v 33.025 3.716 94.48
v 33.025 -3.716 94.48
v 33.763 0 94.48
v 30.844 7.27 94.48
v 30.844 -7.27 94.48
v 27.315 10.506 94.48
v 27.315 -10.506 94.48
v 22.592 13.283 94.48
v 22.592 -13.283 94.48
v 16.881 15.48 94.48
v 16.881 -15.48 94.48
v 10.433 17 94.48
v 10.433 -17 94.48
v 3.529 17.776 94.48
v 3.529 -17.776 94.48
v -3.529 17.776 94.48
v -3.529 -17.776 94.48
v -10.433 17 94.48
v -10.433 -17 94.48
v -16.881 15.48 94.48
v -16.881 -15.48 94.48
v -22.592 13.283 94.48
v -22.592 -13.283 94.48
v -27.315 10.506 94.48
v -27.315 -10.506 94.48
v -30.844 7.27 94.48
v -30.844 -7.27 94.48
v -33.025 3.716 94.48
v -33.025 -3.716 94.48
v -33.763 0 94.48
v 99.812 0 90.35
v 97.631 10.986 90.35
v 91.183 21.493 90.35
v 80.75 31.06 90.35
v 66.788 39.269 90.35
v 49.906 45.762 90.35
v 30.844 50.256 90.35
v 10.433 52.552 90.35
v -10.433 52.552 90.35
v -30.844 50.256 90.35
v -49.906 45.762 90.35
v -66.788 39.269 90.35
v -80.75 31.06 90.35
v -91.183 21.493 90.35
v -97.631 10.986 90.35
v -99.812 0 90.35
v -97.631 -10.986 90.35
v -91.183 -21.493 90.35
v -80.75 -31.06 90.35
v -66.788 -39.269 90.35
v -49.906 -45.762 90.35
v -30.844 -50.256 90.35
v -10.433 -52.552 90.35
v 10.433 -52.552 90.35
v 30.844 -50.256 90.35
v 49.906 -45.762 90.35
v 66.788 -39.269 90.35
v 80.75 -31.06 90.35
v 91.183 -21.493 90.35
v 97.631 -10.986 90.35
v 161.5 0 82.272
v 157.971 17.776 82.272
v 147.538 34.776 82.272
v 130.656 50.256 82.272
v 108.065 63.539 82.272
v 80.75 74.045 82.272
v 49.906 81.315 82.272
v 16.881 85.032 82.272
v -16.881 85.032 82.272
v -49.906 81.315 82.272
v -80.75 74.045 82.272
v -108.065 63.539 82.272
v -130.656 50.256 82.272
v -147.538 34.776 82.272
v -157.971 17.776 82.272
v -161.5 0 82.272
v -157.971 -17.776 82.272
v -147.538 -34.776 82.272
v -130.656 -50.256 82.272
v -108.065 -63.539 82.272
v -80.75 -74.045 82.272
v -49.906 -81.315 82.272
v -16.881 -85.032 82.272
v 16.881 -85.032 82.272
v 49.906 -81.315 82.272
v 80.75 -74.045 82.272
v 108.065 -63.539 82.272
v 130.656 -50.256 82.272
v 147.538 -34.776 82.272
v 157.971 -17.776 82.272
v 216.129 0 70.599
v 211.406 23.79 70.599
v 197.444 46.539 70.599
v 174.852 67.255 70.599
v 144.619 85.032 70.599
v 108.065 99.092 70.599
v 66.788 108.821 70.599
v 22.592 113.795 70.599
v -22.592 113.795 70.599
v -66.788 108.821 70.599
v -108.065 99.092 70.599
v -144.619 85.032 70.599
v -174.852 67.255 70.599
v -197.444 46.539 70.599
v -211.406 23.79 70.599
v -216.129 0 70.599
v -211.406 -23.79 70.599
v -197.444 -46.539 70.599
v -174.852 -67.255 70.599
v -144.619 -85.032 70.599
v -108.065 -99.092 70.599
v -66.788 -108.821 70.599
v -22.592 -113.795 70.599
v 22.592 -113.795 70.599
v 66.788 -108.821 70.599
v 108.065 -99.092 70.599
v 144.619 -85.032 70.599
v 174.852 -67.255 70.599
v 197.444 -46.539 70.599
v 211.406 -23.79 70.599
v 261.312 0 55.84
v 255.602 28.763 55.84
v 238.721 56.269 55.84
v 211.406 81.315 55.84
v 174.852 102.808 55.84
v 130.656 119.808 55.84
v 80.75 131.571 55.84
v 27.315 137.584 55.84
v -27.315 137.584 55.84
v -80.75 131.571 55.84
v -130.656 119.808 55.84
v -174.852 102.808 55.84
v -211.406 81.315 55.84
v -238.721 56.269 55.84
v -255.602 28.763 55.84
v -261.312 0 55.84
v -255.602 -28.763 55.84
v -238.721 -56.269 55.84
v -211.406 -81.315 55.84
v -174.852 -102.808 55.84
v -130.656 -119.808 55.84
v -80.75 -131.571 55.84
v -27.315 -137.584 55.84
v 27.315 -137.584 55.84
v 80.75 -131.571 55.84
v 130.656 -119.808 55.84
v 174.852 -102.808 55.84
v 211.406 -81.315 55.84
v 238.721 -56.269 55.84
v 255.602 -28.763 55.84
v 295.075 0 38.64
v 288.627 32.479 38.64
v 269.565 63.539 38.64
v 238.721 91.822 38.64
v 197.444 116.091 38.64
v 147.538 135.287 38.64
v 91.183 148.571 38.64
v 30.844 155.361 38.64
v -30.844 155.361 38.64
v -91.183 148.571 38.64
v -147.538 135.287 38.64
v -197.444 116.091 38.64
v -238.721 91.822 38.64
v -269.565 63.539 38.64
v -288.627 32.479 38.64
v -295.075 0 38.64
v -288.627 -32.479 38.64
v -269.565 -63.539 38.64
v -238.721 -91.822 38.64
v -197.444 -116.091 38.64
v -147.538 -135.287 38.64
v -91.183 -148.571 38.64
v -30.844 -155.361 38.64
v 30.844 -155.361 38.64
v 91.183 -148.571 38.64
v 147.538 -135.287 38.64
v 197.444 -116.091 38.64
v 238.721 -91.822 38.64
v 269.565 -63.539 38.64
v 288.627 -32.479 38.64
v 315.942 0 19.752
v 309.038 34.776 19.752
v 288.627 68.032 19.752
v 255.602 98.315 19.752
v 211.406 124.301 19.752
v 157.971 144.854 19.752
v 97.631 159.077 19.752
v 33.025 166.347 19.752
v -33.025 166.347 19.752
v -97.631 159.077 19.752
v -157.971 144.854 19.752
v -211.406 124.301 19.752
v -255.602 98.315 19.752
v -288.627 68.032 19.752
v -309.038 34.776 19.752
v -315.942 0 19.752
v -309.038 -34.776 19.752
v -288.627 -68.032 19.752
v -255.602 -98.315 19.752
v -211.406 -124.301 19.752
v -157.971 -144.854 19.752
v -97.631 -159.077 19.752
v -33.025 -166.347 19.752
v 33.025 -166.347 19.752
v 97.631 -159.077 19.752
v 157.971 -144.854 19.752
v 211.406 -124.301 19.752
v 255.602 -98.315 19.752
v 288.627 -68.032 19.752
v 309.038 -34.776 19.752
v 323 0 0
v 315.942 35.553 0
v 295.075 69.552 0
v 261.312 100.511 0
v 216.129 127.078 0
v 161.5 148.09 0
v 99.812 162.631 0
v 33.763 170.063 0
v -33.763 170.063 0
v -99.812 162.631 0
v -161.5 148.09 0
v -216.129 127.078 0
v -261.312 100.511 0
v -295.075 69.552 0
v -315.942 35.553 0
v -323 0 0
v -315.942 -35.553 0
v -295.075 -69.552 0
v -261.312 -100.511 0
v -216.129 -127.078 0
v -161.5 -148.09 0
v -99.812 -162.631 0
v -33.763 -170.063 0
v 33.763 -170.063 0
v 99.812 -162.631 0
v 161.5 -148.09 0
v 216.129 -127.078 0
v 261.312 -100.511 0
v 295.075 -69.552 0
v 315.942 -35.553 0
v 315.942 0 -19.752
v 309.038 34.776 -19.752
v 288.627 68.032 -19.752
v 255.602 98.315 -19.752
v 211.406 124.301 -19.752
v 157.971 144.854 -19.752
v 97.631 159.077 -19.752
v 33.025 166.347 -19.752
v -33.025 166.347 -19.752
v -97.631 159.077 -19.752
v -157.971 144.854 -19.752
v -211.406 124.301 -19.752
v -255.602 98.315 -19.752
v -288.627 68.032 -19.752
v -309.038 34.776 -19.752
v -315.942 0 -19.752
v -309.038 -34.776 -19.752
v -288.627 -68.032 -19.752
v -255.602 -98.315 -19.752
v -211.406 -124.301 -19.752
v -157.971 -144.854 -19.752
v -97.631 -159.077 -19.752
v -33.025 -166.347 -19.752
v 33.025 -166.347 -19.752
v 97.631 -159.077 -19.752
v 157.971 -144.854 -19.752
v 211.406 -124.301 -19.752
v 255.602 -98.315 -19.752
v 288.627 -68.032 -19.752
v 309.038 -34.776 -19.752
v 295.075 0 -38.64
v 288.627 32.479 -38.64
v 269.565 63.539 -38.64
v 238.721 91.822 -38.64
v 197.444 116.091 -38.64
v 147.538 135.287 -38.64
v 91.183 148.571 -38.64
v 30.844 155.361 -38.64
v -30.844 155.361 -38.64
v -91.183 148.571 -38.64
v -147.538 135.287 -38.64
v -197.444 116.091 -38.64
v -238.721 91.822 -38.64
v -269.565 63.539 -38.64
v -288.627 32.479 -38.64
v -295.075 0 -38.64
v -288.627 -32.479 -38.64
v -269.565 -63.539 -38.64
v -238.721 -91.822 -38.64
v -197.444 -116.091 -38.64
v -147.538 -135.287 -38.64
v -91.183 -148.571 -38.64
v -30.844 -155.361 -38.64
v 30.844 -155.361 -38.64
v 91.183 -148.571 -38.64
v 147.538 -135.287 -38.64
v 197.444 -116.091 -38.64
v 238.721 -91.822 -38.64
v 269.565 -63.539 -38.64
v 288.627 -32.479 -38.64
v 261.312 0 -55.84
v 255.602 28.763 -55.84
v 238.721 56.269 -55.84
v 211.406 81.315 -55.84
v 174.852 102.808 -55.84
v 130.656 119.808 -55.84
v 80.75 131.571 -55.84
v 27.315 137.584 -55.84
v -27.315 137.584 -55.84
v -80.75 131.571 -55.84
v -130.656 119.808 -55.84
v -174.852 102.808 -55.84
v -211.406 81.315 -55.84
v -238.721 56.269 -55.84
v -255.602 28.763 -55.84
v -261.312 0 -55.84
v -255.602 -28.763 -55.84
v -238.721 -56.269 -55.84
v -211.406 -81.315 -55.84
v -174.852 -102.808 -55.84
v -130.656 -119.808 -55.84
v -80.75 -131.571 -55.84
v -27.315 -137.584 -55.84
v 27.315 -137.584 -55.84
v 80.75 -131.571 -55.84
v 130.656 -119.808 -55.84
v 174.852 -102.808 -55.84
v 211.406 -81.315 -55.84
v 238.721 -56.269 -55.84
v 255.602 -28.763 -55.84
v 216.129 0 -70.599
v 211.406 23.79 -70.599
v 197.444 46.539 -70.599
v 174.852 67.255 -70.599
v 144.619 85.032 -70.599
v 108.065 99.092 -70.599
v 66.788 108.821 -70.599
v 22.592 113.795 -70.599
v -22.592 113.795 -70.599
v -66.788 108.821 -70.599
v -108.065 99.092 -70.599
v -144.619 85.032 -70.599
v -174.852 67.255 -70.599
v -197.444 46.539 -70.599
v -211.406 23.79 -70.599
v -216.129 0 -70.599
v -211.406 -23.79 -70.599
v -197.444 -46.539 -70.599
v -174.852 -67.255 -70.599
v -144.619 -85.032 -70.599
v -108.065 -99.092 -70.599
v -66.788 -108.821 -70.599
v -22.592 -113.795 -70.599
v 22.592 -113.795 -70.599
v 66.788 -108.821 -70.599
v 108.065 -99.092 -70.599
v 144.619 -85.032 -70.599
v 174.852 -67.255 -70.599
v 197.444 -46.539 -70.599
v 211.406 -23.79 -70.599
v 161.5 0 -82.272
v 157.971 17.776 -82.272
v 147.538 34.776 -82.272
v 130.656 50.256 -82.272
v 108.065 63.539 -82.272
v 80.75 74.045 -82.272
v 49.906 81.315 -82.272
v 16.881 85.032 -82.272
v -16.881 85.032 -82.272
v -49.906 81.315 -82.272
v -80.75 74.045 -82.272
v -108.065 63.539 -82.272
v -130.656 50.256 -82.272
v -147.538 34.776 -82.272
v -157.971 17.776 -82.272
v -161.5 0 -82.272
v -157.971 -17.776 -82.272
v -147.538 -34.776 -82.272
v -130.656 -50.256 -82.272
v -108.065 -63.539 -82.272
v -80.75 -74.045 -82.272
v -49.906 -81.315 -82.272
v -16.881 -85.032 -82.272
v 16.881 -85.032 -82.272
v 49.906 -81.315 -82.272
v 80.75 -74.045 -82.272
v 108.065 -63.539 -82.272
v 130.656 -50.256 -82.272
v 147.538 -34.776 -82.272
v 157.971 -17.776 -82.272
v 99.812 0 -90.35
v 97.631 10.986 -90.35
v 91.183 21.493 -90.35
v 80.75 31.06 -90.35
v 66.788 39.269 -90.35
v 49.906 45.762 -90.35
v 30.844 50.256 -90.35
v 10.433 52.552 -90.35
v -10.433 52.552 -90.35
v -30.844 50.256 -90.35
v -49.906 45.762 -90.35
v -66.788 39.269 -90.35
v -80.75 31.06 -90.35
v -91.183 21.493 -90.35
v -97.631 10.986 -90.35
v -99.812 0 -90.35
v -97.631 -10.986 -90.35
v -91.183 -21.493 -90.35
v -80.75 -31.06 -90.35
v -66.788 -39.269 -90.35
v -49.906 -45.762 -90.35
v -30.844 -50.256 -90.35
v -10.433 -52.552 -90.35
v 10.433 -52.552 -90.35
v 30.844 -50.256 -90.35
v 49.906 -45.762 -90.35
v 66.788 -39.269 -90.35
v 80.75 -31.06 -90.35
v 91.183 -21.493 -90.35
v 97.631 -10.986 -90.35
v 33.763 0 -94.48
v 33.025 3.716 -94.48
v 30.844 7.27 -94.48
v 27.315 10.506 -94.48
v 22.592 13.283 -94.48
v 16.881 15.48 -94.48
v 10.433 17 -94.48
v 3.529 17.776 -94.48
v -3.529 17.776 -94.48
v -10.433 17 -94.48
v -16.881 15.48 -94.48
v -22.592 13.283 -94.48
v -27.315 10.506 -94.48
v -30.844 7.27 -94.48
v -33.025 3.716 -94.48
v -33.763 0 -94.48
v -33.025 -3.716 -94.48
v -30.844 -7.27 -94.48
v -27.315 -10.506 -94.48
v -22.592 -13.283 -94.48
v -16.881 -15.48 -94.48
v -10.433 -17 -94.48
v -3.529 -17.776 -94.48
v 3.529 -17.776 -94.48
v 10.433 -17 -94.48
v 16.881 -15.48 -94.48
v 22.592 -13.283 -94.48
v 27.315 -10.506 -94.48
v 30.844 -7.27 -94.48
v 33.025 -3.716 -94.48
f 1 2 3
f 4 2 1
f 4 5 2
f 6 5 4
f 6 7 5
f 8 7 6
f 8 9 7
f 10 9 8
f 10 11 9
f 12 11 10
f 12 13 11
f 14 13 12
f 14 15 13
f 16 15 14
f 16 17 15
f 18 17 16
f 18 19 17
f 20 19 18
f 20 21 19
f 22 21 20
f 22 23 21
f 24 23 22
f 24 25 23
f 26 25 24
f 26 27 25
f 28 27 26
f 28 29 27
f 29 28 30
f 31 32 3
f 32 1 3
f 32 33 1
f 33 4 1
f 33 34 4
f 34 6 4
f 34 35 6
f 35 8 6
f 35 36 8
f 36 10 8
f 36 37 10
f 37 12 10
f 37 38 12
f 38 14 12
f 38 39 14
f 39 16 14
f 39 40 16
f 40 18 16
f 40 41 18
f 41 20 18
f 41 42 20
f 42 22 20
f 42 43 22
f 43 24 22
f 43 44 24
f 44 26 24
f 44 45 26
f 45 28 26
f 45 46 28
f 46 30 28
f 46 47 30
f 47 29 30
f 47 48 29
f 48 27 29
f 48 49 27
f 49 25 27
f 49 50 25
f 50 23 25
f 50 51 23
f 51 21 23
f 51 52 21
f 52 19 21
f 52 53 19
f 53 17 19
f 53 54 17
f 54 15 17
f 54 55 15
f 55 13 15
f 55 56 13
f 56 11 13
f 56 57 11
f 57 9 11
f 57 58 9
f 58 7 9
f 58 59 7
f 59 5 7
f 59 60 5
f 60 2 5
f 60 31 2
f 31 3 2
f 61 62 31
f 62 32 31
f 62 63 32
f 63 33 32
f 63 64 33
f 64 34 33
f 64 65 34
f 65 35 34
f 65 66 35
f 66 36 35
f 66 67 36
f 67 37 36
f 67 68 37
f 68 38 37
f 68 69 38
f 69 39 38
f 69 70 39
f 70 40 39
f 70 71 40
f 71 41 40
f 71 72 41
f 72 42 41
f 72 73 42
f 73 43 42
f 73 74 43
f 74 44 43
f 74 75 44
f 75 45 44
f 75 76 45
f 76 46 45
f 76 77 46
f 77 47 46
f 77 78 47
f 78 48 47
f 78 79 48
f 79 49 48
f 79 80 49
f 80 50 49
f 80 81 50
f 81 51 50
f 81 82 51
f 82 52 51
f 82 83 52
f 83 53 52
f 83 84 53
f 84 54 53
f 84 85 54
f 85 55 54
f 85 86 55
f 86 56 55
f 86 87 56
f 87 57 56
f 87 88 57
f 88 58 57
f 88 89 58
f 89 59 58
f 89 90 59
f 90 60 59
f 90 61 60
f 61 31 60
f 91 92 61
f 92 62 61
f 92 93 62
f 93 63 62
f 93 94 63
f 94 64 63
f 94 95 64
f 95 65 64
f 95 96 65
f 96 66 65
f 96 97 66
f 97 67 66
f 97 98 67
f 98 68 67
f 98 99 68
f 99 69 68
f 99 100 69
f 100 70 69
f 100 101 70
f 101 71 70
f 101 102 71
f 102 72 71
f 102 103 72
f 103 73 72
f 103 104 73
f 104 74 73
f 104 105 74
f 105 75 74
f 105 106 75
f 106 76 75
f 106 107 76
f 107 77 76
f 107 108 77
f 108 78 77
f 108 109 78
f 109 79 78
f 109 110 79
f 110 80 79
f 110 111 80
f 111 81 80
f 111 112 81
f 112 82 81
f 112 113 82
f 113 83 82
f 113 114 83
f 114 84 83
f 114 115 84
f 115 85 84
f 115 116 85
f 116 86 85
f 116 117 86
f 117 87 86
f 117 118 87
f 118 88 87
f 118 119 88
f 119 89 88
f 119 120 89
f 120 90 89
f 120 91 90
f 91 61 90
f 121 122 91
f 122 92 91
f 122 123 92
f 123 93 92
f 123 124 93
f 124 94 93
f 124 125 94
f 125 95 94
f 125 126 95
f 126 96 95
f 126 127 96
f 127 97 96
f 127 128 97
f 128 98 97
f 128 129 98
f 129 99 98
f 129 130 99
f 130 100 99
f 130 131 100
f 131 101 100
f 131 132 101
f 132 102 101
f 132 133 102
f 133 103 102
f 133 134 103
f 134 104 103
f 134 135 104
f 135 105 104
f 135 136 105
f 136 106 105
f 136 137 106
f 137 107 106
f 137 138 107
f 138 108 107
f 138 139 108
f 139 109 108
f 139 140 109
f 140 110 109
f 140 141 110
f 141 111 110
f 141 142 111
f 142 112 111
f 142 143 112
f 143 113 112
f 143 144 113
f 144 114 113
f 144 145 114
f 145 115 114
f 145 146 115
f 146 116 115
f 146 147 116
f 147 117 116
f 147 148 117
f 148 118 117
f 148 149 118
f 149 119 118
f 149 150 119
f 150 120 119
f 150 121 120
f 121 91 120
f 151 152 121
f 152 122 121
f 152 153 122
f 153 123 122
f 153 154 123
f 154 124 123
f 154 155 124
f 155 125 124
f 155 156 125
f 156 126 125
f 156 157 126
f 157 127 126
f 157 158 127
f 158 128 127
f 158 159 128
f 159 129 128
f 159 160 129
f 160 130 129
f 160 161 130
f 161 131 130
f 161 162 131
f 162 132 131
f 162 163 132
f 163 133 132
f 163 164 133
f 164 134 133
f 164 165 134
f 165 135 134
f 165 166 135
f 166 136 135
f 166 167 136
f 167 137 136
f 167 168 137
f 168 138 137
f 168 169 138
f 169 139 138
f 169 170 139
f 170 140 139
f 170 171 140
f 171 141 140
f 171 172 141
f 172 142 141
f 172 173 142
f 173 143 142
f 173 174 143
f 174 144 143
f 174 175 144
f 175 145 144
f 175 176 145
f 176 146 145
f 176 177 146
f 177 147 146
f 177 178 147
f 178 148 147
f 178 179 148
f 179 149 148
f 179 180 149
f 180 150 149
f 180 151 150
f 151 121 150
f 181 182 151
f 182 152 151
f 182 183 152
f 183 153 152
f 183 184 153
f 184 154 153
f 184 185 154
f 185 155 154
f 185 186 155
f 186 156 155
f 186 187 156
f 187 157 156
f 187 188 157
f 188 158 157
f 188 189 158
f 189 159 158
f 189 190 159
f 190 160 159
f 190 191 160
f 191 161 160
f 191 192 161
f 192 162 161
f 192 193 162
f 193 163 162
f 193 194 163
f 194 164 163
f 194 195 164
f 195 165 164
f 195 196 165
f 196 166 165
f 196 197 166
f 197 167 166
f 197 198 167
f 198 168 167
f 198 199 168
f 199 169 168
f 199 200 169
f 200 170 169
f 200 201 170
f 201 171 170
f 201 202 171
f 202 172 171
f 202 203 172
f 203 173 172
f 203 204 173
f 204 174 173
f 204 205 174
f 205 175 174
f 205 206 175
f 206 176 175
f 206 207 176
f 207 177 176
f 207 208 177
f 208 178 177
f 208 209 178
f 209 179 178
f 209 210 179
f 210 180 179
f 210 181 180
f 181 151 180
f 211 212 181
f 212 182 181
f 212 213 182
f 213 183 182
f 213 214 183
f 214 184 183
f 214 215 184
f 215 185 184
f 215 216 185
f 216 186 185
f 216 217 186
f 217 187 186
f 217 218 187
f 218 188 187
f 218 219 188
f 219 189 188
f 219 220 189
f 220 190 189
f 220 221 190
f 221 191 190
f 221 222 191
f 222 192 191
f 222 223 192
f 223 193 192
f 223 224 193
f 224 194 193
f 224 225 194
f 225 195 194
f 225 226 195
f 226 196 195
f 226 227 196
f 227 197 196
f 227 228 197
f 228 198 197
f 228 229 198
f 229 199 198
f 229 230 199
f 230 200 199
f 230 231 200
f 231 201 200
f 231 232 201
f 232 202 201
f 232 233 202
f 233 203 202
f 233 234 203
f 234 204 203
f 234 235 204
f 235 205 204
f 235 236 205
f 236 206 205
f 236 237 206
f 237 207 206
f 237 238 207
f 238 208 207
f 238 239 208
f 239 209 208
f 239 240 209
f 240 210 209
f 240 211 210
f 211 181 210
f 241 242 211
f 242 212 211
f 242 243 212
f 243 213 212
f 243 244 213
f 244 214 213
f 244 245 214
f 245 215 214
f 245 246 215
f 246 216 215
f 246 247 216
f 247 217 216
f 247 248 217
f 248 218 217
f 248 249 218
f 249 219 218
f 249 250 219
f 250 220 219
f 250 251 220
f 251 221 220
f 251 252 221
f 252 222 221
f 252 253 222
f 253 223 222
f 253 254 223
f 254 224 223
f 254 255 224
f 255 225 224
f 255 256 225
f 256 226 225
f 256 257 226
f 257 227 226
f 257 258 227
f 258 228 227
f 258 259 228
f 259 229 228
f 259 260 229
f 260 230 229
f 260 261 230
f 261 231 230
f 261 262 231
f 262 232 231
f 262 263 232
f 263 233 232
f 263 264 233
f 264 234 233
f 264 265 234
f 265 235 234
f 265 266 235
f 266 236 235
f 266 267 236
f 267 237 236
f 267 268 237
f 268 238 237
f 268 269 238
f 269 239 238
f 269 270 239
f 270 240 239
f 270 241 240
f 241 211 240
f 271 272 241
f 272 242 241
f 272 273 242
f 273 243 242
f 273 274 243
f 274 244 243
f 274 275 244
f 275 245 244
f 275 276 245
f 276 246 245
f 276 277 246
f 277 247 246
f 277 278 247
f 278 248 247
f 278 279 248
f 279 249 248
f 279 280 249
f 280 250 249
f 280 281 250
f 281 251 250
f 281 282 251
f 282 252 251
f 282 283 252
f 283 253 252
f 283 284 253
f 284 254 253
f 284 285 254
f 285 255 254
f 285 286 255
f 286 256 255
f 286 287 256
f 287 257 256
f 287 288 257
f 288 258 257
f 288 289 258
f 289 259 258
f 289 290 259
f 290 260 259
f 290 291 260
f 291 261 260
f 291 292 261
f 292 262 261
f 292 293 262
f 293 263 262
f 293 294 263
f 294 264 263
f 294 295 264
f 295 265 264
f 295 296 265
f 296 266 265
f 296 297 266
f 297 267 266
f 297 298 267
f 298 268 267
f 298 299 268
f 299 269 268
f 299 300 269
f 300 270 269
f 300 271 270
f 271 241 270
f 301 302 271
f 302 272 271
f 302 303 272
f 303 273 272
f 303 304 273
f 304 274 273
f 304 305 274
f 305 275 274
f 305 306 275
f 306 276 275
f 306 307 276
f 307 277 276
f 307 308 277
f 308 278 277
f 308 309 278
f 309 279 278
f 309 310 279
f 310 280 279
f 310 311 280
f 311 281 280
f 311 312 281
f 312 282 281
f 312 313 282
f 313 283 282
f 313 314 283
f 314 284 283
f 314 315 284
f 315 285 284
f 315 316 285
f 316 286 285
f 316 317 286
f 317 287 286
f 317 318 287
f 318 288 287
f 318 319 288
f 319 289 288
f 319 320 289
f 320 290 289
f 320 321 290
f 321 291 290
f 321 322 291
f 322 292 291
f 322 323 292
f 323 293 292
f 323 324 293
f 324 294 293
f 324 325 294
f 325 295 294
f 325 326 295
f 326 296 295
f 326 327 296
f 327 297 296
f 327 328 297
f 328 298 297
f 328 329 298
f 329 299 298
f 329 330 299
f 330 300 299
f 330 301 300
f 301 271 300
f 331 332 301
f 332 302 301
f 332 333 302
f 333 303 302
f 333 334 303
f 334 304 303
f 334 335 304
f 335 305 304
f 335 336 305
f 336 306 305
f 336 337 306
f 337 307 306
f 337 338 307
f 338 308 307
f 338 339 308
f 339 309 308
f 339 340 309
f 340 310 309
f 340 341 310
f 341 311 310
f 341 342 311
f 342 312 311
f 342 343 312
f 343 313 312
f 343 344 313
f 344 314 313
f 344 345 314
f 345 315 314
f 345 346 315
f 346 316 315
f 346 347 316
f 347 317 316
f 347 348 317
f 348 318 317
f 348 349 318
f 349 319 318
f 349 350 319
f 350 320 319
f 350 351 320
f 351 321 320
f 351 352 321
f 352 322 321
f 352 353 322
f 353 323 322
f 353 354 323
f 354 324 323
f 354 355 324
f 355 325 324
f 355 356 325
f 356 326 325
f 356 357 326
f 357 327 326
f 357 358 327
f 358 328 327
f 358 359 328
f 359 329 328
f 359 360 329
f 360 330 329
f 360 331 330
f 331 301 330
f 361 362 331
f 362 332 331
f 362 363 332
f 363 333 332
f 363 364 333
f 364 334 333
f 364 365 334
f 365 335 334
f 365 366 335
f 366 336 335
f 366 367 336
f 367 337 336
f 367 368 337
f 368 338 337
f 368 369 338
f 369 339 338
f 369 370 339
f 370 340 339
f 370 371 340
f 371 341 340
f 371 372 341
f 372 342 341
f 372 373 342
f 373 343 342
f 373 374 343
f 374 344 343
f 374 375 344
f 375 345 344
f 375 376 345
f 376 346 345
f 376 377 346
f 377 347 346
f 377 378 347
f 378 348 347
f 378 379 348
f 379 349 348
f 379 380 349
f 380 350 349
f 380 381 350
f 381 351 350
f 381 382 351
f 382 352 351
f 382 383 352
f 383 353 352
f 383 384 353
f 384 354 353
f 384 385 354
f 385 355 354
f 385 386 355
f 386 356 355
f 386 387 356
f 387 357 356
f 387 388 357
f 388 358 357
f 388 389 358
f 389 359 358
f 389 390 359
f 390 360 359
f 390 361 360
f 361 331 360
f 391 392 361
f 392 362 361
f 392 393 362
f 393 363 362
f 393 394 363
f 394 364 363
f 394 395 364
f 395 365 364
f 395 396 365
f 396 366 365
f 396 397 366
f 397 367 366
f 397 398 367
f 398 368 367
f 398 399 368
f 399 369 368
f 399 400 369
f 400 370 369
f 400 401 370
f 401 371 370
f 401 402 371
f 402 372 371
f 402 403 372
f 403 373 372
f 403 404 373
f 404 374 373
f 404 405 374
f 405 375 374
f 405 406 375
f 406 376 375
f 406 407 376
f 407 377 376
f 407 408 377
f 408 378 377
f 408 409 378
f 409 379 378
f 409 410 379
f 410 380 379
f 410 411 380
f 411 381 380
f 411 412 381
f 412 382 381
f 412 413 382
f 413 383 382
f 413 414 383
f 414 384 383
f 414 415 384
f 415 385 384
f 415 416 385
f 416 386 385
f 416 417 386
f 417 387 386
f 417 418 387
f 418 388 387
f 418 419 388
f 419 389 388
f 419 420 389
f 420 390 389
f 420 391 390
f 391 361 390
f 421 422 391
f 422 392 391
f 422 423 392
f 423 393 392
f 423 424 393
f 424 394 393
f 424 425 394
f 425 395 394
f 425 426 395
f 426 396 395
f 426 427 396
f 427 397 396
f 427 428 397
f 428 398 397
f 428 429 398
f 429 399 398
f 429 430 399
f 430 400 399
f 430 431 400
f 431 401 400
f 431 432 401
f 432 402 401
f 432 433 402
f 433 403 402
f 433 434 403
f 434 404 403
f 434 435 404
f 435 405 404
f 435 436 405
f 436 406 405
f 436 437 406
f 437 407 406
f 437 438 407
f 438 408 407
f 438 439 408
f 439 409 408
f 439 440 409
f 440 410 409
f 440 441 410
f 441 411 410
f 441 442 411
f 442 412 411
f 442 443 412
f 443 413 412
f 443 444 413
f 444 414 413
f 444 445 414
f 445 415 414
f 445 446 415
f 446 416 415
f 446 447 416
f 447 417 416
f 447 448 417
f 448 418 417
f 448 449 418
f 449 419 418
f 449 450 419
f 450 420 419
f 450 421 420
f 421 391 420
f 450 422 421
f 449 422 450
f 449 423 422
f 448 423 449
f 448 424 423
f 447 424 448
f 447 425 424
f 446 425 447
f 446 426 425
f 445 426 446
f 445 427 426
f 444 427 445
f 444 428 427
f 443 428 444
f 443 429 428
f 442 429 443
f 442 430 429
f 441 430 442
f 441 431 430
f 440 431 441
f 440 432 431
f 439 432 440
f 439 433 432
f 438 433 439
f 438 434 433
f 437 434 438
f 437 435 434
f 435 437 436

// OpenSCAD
// Generated by SolidPython 1.0.1 on 2020-07-29 00:46:53


scale(v = [17, 9, 5]) {
	sphere(r = 19);
}
/***********************************************
*********      SolidPython code:      **********
************************************************
 
# import packages: SolidPython
from solid import *
from solid.utils import *
from itertools import chain, combinations, permutations


class Resize:

    def __init__(self, scad_file):
        self.scad_file = scad_file
        #self.scad_file = import_scad(scad_file)
        # cone/cylinder param:
        self.r1 = 0
        self.r2 = 0
        self.h = 0
        # rectangular prism param:
        self.w = 0
        self.l = 0
        # ellipse param:
        self.r = 0

    # import OpenScad code (file name corresponds to shape)


    # classify shape + parameters
    def assign(self, param1, param2, param3):
        if self.scad_file == 'cone.scad':
            self.r1 = param1
            self.r2 = param2
            self.h = param3
        elif self.scad_file == 'cylinder.scad':
            self.r1 = param1
            self.r2 = param2
            self.h = param3
        elif self.scad_file == 'rectangularPrism.scad':
            self.h = param1
            self.l = param2
            self.w = param3
        else:
            self.r = param1
            self.h = param2

    # resize parameters
    def iterate(self):
        x = range(3, 20, 2)
        i = 1
        if self.scad_file == 'cone.scad':
            tempList = list(permutations(x, 2))
            for temp in tempList:
                param1 = temp[0]
                param2 = temp[1]
                filepath = 'produced_scad_files/' + 'cone' + str(param1) + '_' + str(param2) + '_' + '.scad'
                scad_render_to_file(cylinder(h=param1, r1=param2, r2=0), filepath)

        elif self.scad_file == 'cylinder.scad':
            tempList = list(permutations(x, 3))
            for temp in tempList:
                param1 = temp[0]
                param2 = temp[1]
                filepath = 'produced_scad_files/' + 'cylinder' + str(param1) + '_' + str(param2) + '_' + '.scad'
                scad_render_to_file(cylinder(h=param1, r1=param2, r2=param2), filepath)

        elif self.scad_file == 'rectangularPrism.scad':
            tempList = list(permutations(x, 3))
            for temp in tempList:
                param1 = temp[0]
                param2 = temp[1]
                param3 = temp[2]
                filepath = 'produced_scad_files/' + 'rectangularPrism' + str(param1) + '_' + str(param2) + '_' + str(
                    param3) + '.scad'
                scad_render_to_file(cube(size=(param1, param2, param3)), filepath)

        elif self.scad_file == 'ellipse.scad':
            tempList = list(permutations(x, 4))
            for temp in tempList:
                param1 = temp[0]
                param2 = temp[1]
                param3 = temp[2]
                param4 = temp[3]
                filepath = 'produced_scad_files/' + 'ellipse' + str(param1) + '_' + str(param2) + '_' + str(param3) + '_' + str(param4) + '.scad'
                scad_render_to_file(scale([param1, param2, param3])(sphere(r=param4)), filepath)

    def render_to_scadfile(self):
        scad_render_to_file(scad, 'example.scad') 
 
************************************************/
